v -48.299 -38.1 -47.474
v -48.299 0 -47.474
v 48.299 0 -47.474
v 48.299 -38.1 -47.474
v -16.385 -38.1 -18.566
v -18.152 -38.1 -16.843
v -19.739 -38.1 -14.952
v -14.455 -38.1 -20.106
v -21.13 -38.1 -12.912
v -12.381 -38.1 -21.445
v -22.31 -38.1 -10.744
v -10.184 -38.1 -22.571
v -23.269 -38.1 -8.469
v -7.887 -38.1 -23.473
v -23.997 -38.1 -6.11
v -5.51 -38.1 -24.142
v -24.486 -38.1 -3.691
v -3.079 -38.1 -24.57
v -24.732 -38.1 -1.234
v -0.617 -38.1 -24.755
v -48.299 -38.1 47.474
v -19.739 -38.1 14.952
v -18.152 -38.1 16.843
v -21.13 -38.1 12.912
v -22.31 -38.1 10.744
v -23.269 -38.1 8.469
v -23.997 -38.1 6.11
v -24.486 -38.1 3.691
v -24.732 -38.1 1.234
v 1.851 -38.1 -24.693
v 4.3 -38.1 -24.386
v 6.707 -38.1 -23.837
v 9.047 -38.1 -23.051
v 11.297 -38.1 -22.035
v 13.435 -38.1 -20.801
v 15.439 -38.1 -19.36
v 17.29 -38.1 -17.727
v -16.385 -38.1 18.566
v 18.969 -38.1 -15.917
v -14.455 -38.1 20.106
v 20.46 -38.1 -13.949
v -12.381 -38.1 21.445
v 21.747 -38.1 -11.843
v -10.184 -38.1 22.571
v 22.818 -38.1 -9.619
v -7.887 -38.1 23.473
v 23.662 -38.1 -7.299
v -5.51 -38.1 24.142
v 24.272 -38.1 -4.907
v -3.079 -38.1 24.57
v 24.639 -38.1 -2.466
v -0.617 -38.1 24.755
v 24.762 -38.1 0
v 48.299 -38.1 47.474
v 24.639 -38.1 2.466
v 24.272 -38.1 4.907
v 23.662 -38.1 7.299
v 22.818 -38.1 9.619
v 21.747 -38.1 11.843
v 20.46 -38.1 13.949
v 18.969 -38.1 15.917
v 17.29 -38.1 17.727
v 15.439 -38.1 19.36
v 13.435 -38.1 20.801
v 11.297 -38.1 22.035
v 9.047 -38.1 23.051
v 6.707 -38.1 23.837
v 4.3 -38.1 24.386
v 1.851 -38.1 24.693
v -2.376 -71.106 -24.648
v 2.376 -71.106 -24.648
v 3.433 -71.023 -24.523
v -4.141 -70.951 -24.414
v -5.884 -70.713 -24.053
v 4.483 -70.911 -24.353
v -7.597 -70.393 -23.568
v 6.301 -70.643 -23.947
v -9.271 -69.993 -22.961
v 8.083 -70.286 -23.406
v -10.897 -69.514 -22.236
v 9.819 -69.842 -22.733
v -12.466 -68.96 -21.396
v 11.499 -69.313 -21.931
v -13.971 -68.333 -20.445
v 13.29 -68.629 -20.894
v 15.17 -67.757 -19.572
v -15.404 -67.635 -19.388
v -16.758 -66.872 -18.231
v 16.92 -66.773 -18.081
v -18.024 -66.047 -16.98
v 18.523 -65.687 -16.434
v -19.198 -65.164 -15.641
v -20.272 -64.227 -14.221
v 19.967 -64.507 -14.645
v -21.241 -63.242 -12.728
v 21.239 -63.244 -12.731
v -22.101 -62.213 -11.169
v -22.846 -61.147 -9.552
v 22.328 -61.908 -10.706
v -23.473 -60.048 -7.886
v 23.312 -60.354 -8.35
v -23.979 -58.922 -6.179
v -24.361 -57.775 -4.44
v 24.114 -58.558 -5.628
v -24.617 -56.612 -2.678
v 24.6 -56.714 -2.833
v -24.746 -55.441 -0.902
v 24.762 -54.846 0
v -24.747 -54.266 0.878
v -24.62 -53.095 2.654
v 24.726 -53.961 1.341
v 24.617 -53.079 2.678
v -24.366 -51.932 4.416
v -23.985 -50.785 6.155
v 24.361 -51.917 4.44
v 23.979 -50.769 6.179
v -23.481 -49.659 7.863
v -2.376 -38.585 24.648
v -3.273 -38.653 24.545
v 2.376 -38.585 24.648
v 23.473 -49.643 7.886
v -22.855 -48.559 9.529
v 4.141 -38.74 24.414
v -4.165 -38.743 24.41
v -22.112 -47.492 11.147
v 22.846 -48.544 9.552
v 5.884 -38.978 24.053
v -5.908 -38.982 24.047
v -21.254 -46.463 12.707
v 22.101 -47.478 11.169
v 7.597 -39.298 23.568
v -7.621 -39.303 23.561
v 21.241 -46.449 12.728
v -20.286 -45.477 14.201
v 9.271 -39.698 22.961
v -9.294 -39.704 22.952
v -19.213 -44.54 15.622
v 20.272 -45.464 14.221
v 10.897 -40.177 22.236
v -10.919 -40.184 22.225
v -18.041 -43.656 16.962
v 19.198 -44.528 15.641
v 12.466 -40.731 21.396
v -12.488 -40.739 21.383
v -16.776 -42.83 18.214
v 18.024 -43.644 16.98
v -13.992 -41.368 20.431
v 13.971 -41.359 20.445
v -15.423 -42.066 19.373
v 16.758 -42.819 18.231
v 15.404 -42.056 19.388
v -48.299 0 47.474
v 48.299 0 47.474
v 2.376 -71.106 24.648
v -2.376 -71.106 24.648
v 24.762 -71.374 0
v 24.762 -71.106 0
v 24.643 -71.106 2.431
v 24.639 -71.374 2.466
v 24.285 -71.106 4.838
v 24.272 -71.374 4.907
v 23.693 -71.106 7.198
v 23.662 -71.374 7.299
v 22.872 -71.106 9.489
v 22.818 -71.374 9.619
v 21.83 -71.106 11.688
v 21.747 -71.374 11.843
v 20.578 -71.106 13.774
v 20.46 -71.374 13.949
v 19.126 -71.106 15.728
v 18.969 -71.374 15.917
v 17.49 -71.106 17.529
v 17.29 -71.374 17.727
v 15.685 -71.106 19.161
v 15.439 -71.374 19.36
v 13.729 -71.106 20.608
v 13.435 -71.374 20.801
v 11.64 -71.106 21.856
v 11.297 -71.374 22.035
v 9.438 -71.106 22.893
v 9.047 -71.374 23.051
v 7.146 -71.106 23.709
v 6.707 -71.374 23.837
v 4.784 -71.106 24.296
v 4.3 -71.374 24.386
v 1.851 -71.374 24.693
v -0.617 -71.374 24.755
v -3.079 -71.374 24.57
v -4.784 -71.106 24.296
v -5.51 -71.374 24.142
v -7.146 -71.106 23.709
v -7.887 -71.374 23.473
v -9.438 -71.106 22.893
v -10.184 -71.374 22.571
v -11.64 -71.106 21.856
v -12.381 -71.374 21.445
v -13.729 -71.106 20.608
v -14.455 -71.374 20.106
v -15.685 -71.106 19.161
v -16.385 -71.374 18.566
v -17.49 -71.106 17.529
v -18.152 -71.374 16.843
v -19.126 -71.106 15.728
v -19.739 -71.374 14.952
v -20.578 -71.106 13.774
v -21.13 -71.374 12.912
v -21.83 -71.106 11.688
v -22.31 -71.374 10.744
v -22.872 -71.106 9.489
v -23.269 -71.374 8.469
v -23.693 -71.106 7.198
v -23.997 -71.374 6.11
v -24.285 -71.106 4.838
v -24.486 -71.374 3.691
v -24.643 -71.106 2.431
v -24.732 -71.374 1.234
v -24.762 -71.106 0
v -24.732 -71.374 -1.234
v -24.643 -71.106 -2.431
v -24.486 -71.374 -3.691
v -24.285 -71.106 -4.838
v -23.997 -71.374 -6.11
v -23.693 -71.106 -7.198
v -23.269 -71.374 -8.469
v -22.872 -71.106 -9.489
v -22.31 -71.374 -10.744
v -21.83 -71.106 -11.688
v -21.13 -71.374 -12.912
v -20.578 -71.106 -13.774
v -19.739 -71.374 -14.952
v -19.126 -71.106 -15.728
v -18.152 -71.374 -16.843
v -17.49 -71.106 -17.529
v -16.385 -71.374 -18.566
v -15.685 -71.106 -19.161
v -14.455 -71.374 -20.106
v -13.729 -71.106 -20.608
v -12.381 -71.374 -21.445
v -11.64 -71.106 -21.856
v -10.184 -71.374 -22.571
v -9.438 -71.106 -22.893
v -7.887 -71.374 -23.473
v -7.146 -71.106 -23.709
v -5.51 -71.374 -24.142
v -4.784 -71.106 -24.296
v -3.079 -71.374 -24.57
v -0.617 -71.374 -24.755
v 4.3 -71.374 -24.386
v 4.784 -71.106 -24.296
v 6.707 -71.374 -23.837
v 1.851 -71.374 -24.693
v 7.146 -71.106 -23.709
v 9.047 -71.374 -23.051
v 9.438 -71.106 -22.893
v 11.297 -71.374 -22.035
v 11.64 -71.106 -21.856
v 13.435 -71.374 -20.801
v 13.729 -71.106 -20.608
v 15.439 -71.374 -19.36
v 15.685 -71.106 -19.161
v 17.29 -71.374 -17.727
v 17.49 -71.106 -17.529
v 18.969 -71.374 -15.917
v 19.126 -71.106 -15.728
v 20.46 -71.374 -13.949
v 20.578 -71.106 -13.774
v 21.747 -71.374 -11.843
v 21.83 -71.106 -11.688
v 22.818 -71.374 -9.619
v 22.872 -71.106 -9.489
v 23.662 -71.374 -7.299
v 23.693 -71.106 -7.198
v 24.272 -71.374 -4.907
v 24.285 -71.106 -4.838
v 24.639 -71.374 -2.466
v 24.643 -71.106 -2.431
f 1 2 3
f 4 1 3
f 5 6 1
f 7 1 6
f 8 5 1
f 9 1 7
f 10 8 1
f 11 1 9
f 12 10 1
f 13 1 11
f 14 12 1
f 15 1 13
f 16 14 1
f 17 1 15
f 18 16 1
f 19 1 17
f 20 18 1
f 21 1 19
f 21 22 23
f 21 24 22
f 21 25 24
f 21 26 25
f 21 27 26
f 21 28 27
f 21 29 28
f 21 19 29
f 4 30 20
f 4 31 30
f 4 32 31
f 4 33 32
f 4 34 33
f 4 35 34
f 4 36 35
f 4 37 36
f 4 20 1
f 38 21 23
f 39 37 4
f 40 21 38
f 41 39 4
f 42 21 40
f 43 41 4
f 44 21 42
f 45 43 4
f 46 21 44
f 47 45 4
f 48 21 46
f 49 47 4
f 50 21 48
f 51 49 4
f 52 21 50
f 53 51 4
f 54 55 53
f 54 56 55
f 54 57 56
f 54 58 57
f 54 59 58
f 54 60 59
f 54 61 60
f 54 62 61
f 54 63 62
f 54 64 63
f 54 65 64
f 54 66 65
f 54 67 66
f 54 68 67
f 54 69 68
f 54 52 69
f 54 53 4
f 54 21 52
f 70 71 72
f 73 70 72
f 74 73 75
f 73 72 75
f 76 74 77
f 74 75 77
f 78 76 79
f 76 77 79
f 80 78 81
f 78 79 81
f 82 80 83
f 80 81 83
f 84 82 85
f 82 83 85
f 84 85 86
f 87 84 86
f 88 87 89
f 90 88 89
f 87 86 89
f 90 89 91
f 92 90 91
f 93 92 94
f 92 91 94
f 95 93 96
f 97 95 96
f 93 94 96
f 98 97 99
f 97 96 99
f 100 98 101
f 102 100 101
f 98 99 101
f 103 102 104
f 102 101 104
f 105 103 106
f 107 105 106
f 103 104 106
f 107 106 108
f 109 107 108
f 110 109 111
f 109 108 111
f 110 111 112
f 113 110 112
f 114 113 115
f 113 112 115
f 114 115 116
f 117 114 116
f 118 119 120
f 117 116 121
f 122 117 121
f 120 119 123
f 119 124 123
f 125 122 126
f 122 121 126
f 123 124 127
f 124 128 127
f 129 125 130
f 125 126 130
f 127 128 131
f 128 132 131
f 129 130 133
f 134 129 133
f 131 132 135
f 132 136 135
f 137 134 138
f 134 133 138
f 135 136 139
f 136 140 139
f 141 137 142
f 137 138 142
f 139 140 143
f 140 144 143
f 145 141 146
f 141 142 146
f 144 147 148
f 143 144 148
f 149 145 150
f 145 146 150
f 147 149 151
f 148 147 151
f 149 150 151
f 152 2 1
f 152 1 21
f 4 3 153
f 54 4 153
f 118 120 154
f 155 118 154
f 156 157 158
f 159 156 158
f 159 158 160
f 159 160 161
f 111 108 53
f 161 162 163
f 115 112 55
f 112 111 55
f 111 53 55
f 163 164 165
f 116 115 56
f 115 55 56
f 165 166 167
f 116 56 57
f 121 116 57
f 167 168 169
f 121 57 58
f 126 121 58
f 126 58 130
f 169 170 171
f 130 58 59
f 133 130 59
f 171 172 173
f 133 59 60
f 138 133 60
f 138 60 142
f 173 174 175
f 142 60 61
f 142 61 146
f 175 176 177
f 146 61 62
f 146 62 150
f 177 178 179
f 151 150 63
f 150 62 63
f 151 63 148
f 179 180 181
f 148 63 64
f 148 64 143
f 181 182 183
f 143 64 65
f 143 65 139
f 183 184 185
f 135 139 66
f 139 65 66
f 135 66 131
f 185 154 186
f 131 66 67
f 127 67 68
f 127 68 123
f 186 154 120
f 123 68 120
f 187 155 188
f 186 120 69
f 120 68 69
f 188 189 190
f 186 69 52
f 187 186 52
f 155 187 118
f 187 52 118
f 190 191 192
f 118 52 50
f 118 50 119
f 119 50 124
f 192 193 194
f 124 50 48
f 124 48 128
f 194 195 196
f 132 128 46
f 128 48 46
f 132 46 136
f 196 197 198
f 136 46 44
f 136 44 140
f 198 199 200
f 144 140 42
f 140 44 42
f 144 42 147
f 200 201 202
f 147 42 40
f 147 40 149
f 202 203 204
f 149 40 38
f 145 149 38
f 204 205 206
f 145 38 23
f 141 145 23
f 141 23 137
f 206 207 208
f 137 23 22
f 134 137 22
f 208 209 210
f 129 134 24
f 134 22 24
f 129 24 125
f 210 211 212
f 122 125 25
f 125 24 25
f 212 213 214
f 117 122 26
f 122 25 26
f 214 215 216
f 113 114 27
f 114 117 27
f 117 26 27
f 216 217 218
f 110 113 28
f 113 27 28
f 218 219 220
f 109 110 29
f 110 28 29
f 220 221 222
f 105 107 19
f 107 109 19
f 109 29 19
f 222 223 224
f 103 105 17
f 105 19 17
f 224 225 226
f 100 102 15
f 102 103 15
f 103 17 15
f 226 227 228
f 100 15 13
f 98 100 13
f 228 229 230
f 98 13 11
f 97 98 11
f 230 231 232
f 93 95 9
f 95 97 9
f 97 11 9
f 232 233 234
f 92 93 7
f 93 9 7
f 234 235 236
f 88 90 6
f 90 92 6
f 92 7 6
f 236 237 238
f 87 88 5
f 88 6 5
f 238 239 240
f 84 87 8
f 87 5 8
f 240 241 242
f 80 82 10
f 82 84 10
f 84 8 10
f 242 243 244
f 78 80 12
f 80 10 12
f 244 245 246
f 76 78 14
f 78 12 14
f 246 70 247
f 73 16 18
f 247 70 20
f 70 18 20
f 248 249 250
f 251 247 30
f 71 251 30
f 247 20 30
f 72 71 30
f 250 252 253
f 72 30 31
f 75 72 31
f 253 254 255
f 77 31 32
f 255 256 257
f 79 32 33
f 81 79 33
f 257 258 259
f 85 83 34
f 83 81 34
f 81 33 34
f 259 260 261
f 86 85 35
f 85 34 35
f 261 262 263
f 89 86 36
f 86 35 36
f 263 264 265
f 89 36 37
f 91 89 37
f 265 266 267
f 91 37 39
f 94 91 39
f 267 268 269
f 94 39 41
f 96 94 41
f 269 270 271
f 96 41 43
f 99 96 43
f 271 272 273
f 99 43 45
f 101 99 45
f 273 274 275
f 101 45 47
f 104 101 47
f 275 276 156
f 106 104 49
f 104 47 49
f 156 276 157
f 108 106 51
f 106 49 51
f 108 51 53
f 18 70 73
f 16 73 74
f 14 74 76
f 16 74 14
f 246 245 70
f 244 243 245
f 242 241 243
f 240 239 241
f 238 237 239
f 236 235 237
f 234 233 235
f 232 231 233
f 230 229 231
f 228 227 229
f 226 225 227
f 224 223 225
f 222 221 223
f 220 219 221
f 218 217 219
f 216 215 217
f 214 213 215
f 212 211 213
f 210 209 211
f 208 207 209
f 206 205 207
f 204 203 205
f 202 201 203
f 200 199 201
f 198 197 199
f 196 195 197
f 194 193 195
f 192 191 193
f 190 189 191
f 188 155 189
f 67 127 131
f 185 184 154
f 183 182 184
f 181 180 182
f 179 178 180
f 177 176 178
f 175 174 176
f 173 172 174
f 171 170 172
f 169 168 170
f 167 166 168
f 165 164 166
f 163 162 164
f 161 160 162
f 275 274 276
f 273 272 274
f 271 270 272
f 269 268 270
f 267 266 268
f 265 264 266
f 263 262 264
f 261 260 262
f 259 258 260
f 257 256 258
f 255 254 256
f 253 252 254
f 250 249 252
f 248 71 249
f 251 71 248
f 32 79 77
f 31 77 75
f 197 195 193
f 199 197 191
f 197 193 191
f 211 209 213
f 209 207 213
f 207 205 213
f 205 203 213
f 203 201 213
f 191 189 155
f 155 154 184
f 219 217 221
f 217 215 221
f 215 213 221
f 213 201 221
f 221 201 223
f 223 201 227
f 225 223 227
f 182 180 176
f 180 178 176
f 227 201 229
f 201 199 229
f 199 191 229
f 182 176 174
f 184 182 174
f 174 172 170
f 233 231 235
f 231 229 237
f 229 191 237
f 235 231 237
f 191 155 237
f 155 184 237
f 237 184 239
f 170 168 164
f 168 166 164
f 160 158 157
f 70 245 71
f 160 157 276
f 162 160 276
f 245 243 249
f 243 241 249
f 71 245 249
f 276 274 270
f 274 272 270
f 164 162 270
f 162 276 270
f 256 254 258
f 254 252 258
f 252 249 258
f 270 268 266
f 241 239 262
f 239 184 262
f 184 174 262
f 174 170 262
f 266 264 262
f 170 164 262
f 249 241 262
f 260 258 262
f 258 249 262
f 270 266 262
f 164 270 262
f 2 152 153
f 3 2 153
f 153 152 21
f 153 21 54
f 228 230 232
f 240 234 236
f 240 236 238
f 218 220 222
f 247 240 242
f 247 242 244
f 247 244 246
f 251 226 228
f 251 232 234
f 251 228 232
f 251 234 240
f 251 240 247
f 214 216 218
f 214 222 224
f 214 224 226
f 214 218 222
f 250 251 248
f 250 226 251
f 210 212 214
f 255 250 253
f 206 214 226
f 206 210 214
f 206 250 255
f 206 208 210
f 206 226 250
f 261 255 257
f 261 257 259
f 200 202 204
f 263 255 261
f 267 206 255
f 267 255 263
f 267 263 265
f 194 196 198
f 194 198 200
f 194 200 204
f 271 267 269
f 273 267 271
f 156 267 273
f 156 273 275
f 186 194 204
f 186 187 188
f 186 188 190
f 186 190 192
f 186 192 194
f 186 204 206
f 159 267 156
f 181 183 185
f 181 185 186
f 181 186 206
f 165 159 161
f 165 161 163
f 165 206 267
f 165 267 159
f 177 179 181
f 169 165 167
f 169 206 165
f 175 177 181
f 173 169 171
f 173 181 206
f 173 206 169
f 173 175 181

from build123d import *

# Parameters (mm, degrees)
F0_W     = 96.598558
F0_H     = 94.948866
F1_DEPTH = 38.1
F2_R     = 24.762498
F3_DEPTH = 33.274
F5_DEPTH = 635


with BuildPart() as f1:
    # F0 (on Front) → F1 (new body)
    with BuildSketch(Plane.XZ):
        Rectangle(F0_W, F0_H)
    extrude(amount=F1_DEPTH)

    # F2 (on face) → F3 (join)
    with BuildSketch(Plane.XZ.offset(38.1)):
        Circle(F2_R)
    extrude(amount=F3_DEPTH)

    # F4 (on Right) → F5 (cut, symmetric)
    with BuildSketch(Plane.YZ):
        Polygon((-71.105659, 24.648242), (-71.105659, -24.648242), (-38.585469, 24.648242), align=None)
    extrude(amount=F5_DEPTH, both=True, mode=Mode.SUBTRACT)


solid = f1.part
